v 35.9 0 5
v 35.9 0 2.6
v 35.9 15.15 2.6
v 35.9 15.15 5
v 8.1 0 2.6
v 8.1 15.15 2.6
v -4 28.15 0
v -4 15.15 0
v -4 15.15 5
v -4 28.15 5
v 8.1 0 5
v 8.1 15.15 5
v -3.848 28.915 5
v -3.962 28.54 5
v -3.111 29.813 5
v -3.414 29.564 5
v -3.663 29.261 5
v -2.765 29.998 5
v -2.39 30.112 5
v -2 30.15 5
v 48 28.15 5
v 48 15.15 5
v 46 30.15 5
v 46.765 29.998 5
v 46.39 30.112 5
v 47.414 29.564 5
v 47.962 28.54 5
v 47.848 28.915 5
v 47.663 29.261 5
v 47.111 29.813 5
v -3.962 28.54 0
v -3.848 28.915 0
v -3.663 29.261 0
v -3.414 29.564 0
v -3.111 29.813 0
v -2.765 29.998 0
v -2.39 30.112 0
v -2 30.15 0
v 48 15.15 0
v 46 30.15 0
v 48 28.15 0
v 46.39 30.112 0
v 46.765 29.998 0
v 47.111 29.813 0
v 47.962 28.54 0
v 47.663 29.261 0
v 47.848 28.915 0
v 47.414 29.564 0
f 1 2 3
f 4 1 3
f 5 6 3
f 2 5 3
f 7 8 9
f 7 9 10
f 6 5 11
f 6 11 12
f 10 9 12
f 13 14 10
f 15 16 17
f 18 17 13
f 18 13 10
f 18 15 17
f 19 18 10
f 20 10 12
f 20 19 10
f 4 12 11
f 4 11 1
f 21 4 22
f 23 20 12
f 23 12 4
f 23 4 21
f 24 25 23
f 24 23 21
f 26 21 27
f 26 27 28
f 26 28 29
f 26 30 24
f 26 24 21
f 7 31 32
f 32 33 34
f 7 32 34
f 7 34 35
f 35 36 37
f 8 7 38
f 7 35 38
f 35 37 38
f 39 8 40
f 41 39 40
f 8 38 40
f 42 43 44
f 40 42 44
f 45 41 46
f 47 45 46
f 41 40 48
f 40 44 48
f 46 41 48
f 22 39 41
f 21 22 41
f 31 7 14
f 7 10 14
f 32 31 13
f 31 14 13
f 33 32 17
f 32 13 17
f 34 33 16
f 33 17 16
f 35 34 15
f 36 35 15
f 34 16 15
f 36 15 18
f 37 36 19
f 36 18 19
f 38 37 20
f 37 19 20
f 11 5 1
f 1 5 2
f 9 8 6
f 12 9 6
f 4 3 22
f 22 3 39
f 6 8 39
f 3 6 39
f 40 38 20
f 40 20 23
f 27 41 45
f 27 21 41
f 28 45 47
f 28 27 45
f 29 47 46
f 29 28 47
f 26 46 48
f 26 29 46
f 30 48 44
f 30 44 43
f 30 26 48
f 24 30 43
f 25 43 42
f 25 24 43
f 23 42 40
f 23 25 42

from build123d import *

# Parameters (mm, degrees)
BOX044_W     = 52
BOX044_H     = 15
BOX044_DEPTH = 5
FILLET008_R  = 2
BOX043_W     = 27.8
BOX043_H     = 15.15
BOX043_DEPTH = 2.4


with BuildPart() as fillet008:
    # Box044 → Box044 (new body)
    with BuildSketch(Plane(origin=(-4, 17.15, 0), x_dir=(1, 0, 0), z_dir=(0, 0, 1))):
        with Locations((26, 7.5)):
            Rectangle(BOX044_W, BOX044_H)
    extrude(amount=BOX044_DEPTH)

    # Fillet008
    fillet008_edges = [fillet008.edges().sort_by_distance(p)[0] for p in [
        (-4, 32.15, 2.5),
        (48, 32.15, 2.5),
    ]]
    fillet(fillet008_edges, radius=FILLET008_R)


with BuildPart() as exterior_parte2_v2:
    # Box043 → Box043 (new body)
    with BuildSketch(Plane(origin=(8.1, 2, 2.6), x_dir=(1, 0, 0), z_dir=(0, 0, 1))):
        with Locations((13.9, 7.575)):
            Rectangle(BOX043_W, BOX043_H)
    extrude(amount=BOX043_DEPTH)

    # Fusion023005: union Fillet008
    add(fillet008.part)


with BuildPart() as exterior_parte2_v2_1:
    # Fusion023005 placement: moved
    add(exterior_parte2_v2.part.moved(Location((0, -2, 0))))


solid = exterior_parte2_v2_1.part
